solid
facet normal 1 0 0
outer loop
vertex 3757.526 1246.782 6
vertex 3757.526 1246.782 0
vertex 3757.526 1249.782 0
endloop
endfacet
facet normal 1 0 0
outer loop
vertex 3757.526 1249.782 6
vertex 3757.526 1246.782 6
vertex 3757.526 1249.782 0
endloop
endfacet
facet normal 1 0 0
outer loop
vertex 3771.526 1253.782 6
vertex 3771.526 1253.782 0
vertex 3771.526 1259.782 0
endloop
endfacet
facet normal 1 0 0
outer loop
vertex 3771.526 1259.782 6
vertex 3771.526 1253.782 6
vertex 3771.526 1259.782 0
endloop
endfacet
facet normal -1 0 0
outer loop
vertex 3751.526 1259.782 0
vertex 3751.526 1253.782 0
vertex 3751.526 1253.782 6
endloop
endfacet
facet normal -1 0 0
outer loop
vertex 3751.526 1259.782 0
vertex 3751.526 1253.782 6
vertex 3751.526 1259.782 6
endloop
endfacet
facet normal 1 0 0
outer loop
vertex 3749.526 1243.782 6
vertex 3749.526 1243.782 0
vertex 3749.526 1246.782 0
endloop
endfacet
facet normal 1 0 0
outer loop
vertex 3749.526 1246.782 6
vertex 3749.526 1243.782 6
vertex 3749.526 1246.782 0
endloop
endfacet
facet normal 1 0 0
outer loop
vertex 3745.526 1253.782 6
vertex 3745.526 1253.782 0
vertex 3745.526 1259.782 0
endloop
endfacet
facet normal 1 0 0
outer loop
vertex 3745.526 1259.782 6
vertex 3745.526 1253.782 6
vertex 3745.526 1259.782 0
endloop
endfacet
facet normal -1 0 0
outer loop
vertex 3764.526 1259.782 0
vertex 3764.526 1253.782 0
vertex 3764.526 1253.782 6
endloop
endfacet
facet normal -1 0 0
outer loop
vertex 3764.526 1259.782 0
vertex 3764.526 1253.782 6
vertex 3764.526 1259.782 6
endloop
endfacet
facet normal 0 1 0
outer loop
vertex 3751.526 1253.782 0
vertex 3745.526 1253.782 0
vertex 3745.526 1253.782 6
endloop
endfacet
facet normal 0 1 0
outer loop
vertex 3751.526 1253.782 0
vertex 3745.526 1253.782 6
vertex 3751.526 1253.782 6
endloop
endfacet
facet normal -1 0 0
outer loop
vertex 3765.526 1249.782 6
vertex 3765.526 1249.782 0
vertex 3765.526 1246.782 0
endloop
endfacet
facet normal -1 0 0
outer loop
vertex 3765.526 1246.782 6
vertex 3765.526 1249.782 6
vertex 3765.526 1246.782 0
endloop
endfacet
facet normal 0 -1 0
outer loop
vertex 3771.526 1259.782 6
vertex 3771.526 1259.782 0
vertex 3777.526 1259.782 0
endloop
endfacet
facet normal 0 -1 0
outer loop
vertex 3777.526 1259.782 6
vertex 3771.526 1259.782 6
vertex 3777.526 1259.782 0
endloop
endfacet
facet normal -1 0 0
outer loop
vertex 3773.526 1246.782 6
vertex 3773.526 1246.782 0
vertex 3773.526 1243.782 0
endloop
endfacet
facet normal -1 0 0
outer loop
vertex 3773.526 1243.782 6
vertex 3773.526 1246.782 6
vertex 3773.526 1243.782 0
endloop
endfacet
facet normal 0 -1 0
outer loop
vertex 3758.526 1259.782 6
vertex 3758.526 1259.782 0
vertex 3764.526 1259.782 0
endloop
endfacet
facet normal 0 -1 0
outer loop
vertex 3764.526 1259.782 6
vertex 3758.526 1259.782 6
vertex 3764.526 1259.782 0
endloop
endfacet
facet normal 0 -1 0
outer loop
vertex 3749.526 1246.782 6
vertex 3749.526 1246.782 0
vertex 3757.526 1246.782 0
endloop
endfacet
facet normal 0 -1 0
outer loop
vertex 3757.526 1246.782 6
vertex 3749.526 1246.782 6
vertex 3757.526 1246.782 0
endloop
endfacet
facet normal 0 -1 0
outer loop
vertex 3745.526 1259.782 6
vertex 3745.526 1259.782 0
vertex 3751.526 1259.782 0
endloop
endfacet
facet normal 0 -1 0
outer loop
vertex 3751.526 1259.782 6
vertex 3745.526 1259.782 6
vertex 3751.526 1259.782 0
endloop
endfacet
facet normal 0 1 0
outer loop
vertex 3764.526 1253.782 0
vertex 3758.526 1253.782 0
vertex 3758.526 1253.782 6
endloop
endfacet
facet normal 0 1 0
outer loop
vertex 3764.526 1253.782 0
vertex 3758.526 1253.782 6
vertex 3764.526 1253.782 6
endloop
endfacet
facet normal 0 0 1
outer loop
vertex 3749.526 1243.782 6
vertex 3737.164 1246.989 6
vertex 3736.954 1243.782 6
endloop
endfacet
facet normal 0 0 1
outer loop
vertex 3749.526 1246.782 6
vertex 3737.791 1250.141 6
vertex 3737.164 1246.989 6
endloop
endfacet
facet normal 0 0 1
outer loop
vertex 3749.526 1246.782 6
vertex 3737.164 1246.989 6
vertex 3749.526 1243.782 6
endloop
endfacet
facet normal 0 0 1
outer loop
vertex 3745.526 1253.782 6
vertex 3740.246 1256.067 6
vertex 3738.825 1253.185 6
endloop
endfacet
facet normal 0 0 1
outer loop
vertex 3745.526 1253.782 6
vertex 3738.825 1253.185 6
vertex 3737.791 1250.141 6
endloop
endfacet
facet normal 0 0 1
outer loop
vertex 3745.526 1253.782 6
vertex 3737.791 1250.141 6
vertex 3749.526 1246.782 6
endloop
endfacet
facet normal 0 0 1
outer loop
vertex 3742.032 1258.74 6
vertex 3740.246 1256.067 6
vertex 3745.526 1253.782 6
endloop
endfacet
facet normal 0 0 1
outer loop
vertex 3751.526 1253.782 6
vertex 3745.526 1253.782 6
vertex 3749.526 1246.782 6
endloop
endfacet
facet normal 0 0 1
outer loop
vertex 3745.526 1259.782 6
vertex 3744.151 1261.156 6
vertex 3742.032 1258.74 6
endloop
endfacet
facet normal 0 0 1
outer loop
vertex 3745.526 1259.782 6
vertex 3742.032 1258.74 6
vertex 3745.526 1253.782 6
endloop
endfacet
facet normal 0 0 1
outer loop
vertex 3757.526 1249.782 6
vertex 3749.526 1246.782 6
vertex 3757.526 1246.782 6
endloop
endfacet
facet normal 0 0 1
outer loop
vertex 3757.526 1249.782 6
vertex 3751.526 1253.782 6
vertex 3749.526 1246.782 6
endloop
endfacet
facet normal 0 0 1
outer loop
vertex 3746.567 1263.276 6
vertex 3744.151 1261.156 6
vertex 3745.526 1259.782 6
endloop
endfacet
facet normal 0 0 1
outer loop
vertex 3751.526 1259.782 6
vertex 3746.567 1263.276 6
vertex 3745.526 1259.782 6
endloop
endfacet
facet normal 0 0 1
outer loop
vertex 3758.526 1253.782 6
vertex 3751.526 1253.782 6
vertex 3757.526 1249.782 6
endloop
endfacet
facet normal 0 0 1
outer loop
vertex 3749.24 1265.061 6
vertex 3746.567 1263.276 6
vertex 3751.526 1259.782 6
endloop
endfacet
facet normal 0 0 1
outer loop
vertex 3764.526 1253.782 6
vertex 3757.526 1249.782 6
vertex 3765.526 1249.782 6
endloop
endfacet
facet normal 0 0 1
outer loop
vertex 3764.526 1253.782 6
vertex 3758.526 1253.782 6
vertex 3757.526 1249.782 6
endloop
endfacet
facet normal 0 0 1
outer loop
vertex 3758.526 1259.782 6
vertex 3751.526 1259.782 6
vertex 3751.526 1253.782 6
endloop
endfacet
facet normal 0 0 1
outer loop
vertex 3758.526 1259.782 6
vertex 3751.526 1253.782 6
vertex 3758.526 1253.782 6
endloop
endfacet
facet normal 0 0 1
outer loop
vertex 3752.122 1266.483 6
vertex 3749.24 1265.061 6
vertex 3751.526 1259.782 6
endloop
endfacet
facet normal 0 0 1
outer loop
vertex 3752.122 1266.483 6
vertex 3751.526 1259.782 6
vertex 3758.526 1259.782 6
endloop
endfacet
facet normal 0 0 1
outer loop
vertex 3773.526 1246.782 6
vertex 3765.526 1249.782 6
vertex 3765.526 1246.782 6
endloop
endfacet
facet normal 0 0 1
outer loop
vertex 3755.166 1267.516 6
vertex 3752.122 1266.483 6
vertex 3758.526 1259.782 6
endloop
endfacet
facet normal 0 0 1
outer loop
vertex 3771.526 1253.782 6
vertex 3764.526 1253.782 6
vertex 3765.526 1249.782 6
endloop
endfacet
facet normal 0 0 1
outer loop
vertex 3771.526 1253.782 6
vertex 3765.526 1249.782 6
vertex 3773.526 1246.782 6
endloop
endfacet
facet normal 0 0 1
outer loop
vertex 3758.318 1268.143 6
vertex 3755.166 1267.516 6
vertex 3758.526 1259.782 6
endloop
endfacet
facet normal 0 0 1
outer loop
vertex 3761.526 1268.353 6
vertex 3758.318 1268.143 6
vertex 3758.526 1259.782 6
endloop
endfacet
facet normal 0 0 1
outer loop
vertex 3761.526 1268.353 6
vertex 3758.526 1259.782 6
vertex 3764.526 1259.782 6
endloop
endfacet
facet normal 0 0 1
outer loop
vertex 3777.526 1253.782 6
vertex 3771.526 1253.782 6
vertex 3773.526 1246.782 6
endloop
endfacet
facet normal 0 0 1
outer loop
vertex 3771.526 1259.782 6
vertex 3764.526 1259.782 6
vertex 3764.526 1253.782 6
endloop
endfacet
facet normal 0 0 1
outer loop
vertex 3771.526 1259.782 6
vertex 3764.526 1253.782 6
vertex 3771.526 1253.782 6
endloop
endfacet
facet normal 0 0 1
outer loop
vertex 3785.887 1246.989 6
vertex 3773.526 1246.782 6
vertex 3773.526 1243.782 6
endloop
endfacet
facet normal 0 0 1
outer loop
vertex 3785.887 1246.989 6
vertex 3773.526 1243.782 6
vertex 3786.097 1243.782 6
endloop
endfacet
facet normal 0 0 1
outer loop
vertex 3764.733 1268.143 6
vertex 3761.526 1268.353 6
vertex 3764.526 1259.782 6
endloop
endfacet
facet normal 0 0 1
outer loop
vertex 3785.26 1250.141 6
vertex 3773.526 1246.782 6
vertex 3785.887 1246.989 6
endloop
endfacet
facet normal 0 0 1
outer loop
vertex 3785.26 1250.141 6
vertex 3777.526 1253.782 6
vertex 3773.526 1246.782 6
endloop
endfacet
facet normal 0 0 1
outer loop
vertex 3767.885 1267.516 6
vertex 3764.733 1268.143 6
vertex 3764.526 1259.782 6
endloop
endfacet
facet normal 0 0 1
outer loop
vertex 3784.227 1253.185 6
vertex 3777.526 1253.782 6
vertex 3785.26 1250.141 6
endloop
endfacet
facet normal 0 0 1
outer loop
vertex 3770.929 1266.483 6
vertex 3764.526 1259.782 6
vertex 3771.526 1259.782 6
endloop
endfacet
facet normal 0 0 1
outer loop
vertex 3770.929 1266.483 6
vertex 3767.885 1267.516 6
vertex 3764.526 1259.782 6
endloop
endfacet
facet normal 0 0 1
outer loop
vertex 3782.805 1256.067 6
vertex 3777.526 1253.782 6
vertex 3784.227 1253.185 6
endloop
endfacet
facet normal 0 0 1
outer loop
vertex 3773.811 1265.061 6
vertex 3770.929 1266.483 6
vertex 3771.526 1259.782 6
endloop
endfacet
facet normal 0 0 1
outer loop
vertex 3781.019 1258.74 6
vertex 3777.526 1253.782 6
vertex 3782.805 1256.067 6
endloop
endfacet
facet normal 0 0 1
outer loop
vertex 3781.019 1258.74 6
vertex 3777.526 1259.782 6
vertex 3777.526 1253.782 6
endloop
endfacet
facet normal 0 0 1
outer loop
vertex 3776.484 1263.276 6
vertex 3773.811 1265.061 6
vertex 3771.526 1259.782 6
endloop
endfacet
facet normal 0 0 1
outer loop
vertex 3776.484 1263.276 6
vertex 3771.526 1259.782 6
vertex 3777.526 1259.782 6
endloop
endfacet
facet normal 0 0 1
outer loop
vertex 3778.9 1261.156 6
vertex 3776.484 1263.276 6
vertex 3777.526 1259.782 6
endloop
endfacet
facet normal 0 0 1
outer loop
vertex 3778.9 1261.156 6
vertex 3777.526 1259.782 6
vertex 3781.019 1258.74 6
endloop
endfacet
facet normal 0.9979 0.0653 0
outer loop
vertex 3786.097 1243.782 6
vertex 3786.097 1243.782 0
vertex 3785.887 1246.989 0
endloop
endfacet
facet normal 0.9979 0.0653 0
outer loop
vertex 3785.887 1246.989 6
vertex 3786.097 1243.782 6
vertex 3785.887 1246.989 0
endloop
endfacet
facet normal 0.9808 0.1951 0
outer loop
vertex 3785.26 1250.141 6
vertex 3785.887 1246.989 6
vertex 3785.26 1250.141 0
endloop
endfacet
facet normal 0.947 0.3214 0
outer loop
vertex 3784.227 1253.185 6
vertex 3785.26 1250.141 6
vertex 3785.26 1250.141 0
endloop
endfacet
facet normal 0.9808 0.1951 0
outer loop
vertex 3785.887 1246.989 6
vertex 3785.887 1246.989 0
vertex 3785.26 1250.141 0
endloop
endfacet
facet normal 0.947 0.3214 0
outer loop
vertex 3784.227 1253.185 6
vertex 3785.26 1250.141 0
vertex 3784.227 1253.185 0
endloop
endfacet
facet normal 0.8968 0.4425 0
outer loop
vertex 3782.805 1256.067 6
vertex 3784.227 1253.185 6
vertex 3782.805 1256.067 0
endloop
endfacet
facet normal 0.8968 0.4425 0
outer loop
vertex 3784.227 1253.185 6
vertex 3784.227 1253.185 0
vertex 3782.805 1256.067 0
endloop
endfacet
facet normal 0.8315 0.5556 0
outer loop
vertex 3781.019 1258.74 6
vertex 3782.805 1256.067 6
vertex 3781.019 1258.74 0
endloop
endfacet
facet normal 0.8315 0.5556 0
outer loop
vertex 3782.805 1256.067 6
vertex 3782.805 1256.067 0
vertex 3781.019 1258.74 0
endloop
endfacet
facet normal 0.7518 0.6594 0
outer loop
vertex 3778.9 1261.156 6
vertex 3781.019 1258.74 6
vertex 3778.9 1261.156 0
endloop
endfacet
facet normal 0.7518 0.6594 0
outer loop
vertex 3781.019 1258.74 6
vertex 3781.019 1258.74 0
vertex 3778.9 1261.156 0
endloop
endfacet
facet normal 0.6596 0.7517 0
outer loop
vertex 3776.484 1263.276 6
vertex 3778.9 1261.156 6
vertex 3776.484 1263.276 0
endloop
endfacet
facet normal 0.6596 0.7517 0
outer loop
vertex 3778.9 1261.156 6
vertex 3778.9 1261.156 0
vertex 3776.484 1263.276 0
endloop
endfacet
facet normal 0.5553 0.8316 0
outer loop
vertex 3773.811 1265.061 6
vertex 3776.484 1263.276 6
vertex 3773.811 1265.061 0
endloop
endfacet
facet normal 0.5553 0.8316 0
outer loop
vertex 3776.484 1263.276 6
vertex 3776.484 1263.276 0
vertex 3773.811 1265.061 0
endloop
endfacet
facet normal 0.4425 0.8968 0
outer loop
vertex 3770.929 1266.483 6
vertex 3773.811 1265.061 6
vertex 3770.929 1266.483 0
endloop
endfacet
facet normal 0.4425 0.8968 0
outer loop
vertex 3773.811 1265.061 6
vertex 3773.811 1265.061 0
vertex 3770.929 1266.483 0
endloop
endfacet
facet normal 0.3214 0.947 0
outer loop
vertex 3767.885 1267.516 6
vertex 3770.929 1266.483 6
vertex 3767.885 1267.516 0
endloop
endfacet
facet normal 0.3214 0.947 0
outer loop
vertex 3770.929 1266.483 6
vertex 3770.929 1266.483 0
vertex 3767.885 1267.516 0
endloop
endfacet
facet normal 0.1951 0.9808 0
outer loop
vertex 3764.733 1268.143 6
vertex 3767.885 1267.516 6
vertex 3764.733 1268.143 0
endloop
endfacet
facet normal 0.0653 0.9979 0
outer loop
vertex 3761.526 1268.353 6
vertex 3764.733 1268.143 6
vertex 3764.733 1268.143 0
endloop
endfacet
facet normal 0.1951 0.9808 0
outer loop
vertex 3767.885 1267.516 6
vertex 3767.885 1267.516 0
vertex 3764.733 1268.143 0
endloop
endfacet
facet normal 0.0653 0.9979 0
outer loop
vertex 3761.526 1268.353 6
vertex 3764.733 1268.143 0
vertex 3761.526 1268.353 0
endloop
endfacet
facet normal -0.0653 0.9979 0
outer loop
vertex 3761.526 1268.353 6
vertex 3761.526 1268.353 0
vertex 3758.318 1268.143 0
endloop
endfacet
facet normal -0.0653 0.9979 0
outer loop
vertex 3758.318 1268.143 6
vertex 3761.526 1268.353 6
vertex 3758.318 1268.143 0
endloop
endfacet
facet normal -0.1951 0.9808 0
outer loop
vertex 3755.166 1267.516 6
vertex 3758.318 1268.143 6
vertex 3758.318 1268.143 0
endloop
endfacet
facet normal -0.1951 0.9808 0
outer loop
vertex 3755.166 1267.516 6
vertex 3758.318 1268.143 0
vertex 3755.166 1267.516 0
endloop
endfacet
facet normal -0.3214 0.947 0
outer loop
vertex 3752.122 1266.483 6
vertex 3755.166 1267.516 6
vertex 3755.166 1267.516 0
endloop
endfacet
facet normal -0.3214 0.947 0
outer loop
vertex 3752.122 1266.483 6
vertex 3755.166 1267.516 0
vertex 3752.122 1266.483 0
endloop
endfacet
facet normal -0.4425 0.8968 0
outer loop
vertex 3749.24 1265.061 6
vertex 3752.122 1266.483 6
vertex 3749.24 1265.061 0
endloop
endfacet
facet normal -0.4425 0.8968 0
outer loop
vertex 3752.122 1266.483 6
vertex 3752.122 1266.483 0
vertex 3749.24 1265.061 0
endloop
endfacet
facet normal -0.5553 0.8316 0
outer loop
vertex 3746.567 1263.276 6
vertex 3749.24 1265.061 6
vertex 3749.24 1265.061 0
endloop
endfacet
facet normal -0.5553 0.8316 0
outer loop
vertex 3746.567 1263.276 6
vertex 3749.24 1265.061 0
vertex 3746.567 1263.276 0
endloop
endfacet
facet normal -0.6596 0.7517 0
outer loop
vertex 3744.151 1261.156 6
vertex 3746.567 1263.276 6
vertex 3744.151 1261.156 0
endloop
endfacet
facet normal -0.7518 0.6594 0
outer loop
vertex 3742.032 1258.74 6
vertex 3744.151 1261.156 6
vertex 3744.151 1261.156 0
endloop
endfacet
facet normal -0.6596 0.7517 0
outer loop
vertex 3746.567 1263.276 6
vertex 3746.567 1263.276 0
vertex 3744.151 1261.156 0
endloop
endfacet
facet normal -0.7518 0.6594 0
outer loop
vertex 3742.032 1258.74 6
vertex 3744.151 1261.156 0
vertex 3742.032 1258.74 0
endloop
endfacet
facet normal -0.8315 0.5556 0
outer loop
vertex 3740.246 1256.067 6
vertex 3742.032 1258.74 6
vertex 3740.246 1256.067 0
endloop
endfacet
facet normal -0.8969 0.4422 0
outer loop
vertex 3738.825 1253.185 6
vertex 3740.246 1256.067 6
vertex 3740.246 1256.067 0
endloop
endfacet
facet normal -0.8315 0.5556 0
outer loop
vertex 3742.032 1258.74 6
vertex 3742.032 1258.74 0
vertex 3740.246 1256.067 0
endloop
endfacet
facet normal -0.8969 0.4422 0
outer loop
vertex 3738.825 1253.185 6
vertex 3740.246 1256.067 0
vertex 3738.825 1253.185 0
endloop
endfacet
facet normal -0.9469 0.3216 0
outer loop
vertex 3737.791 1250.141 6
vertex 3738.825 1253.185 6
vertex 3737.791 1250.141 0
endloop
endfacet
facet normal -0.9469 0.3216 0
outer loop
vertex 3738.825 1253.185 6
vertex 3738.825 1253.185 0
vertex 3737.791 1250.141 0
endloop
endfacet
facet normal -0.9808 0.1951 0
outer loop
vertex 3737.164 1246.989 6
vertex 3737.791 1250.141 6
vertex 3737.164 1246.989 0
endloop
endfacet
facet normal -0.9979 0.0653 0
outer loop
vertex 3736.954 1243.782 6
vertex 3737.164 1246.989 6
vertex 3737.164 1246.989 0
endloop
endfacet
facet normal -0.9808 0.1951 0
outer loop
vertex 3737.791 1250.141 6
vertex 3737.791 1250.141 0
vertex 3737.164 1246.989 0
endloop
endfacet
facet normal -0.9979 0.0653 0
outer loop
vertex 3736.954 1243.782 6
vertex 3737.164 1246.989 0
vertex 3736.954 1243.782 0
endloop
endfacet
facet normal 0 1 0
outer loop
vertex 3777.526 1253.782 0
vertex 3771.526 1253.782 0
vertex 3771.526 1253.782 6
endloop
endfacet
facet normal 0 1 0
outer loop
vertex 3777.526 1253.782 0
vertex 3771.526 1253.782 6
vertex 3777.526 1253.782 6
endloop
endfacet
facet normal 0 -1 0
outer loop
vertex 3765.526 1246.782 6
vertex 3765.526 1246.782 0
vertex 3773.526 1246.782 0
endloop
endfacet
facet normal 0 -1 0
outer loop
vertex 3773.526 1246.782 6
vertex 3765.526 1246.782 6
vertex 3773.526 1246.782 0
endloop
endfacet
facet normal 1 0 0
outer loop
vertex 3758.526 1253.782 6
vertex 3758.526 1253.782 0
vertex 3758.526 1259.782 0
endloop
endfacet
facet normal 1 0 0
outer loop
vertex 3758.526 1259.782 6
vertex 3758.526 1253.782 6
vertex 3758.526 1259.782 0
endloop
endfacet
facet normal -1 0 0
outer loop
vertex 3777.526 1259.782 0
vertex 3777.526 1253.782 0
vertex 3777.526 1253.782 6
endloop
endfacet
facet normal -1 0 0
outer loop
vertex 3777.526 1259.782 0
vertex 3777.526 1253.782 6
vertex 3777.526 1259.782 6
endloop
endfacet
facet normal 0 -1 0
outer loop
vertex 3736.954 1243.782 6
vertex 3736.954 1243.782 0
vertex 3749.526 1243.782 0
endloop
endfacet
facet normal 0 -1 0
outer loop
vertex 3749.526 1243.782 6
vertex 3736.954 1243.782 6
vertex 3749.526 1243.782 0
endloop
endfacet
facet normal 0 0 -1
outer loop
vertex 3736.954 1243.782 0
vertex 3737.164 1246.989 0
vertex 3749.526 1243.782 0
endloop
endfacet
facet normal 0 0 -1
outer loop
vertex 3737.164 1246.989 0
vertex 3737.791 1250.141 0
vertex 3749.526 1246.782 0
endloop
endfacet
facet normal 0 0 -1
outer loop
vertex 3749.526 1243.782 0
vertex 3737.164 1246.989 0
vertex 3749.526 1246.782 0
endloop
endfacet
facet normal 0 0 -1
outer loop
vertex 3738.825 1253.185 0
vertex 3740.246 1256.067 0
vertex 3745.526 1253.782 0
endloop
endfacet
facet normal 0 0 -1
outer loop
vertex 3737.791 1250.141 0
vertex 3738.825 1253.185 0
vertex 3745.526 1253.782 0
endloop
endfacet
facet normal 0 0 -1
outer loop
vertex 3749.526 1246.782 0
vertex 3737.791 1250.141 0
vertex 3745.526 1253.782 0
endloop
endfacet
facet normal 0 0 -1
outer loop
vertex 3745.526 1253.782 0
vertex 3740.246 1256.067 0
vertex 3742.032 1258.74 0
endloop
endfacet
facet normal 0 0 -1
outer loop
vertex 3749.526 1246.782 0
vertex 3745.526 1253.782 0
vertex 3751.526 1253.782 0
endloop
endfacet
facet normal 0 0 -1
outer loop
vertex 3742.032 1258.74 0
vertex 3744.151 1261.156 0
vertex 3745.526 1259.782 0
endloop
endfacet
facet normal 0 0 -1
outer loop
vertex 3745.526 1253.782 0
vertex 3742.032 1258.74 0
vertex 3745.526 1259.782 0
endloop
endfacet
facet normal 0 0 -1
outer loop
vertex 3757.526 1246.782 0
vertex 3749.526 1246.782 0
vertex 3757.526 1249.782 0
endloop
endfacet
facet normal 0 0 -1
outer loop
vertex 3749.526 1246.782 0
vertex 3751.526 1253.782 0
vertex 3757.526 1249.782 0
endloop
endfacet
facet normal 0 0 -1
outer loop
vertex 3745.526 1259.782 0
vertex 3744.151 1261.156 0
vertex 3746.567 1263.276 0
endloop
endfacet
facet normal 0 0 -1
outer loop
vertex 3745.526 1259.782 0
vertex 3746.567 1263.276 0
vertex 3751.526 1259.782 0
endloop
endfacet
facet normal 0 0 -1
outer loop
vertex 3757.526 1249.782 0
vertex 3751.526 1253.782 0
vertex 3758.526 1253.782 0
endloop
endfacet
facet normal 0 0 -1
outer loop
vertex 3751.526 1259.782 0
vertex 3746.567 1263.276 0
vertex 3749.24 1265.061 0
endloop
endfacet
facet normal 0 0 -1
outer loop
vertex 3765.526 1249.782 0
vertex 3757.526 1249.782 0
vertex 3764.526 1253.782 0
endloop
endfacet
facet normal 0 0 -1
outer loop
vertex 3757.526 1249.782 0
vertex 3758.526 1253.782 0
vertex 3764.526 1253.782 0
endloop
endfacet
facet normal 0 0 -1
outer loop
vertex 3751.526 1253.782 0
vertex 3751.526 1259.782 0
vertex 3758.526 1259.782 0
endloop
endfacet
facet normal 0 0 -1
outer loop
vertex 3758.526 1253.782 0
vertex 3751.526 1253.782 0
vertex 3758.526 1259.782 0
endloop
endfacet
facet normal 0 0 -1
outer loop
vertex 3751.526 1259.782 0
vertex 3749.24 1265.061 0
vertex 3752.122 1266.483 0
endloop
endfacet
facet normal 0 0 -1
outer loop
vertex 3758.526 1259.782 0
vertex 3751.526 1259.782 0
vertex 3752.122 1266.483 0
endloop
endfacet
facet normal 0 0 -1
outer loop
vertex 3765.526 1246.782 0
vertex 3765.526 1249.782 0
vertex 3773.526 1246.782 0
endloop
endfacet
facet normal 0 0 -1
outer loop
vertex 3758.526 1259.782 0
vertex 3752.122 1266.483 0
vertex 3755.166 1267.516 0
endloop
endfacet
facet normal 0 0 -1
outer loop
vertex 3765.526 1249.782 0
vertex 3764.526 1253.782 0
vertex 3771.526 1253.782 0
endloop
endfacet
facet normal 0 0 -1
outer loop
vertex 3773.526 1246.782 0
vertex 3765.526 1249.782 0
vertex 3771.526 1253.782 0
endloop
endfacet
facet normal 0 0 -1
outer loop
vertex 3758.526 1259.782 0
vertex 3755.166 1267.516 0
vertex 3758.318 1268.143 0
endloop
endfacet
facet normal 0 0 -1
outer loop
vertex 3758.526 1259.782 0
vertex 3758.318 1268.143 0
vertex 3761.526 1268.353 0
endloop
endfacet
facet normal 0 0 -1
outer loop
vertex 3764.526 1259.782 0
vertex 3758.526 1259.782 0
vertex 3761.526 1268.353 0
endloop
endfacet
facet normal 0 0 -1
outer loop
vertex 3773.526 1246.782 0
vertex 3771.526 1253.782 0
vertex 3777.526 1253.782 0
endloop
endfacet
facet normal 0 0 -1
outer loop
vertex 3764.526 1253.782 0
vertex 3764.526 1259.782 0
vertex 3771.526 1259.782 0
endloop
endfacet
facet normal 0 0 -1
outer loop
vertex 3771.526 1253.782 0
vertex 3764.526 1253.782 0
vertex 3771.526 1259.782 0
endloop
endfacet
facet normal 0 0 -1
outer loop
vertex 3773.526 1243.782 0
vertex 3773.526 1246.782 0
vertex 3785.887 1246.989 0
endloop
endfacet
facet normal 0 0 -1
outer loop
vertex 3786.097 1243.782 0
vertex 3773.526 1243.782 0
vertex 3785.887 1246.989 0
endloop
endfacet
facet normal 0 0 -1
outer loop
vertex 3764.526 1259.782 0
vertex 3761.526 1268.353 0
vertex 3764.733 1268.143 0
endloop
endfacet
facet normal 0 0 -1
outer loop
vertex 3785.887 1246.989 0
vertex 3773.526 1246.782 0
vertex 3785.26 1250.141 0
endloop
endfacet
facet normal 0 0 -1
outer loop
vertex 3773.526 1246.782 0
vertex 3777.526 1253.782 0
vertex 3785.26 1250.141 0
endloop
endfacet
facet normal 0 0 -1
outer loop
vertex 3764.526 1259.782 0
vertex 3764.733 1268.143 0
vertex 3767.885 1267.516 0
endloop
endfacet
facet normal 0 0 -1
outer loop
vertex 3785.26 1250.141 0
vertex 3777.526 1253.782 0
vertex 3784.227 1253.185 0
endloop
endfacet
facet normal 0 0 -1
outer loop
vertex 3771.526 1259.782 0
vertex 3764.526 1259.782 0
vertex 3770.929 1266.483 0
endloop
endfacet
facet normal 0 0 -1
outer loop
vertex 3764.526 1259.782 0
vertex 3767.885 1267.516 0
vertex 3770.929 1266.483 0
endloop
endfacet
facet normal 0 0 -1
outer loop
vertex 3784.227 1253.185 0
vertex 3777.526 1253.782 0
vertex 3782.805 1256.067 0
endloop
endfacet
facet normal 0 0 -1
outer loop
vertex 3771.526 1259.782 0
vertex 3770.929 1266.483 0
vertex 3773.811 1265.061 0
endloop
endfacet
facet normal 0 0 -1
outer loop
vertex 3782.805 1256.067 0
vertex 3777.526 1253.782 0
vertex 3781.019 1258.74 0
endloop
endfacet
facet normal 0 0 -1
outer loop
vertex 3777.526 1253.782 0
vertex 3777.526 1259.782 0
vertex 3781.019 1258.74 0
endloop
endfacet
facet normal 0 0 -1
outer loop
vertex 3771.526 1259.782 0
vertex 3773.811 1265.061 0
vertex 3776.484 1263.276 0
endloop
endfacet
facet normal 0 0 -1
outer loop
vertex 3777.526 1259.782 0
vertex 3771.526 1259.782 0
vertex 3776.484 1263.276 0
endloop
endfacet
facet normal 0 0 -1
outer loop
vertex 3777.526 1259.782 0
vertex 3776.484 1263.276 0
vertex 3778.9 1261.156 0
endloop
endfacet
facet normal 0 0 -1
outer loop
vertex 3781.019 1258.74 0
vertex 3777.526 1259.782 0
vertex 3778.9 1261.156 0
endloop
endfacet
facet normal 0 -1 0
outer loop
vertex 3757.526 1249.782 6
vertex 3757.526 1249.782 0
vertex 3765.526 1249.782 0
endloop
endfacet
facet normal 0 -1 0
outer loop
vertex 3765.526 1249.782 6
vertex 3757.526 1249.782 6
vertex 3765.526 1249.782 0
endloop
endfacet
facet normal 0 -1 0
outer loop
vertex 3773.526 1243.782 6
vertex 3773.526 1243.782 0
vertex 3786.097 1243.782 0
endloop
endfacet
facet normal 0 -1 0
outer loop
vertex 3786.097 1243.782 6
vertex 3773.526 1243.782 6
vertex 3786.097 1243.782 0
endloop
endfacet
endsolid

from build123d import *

# Parameters (mm, degrees)
MODEL_W             = 6
MODEL_H             = 6
BOSS_EXTRUDE1_DEPTH = 6


with BuildPart() as part:
    # Model → Boss-Extrude1 (new body)
    with BuildSketch(Plane.XY):
        with BuildLine():
            Line((3736.95412545, 1243.781770146), (3749.525554021, 1243.781770146))
            Line((3749.525554021, 1243.781770146), (3749.525554021, 1246.781770146))
            Line((3749.525554021, 1246.781770146), (3757.525554021, 1246.781770146))
            Line((3757.525554021, 1246.781770146), (3757.525554021, 1249.781770146))
            Line((3757.525554021, 1249.781770146), (3765.525554021, 1249.781770146))
            Line((3765.525554021, 1249.781770146), (3765.525554021, 1246.781770146))
            Line((3765.525554021, 1246.781770146), (3773.525554021, 1246.781770146))
            Line((3773.525554021, 1246.781770146), (3773.525554021, 1243.781770146))
            Line((3773.525554021, 1243.781770146), (3786.096982592, 1243.781770146))
            ThreePointArc((3786.096982592, 1243.781770146), (3761.525554021, 1268.353198718), (3736.95412545, 1243.781770146))
        make_face()
        with Locations((3774.525554021, 1256.781770147)):
            Rectangle(MODEL_W, MODEL_H, mode=Mode.SUBTRACT)
        with Locations((3748.525554021, 1256.781770147)):
            Rectangle(MODEL_W, MODEL_H, mode=Mode.SUBTRACT)
        with Locations((3761.525554021, 1256.781770147)):
            Rectangle(MODEL_W, MODEL_H, mode=Mode.SUBTRACT)
    extrude(amount=BOSS_EXTRUDE1_DEPTH)


solid = part.part
